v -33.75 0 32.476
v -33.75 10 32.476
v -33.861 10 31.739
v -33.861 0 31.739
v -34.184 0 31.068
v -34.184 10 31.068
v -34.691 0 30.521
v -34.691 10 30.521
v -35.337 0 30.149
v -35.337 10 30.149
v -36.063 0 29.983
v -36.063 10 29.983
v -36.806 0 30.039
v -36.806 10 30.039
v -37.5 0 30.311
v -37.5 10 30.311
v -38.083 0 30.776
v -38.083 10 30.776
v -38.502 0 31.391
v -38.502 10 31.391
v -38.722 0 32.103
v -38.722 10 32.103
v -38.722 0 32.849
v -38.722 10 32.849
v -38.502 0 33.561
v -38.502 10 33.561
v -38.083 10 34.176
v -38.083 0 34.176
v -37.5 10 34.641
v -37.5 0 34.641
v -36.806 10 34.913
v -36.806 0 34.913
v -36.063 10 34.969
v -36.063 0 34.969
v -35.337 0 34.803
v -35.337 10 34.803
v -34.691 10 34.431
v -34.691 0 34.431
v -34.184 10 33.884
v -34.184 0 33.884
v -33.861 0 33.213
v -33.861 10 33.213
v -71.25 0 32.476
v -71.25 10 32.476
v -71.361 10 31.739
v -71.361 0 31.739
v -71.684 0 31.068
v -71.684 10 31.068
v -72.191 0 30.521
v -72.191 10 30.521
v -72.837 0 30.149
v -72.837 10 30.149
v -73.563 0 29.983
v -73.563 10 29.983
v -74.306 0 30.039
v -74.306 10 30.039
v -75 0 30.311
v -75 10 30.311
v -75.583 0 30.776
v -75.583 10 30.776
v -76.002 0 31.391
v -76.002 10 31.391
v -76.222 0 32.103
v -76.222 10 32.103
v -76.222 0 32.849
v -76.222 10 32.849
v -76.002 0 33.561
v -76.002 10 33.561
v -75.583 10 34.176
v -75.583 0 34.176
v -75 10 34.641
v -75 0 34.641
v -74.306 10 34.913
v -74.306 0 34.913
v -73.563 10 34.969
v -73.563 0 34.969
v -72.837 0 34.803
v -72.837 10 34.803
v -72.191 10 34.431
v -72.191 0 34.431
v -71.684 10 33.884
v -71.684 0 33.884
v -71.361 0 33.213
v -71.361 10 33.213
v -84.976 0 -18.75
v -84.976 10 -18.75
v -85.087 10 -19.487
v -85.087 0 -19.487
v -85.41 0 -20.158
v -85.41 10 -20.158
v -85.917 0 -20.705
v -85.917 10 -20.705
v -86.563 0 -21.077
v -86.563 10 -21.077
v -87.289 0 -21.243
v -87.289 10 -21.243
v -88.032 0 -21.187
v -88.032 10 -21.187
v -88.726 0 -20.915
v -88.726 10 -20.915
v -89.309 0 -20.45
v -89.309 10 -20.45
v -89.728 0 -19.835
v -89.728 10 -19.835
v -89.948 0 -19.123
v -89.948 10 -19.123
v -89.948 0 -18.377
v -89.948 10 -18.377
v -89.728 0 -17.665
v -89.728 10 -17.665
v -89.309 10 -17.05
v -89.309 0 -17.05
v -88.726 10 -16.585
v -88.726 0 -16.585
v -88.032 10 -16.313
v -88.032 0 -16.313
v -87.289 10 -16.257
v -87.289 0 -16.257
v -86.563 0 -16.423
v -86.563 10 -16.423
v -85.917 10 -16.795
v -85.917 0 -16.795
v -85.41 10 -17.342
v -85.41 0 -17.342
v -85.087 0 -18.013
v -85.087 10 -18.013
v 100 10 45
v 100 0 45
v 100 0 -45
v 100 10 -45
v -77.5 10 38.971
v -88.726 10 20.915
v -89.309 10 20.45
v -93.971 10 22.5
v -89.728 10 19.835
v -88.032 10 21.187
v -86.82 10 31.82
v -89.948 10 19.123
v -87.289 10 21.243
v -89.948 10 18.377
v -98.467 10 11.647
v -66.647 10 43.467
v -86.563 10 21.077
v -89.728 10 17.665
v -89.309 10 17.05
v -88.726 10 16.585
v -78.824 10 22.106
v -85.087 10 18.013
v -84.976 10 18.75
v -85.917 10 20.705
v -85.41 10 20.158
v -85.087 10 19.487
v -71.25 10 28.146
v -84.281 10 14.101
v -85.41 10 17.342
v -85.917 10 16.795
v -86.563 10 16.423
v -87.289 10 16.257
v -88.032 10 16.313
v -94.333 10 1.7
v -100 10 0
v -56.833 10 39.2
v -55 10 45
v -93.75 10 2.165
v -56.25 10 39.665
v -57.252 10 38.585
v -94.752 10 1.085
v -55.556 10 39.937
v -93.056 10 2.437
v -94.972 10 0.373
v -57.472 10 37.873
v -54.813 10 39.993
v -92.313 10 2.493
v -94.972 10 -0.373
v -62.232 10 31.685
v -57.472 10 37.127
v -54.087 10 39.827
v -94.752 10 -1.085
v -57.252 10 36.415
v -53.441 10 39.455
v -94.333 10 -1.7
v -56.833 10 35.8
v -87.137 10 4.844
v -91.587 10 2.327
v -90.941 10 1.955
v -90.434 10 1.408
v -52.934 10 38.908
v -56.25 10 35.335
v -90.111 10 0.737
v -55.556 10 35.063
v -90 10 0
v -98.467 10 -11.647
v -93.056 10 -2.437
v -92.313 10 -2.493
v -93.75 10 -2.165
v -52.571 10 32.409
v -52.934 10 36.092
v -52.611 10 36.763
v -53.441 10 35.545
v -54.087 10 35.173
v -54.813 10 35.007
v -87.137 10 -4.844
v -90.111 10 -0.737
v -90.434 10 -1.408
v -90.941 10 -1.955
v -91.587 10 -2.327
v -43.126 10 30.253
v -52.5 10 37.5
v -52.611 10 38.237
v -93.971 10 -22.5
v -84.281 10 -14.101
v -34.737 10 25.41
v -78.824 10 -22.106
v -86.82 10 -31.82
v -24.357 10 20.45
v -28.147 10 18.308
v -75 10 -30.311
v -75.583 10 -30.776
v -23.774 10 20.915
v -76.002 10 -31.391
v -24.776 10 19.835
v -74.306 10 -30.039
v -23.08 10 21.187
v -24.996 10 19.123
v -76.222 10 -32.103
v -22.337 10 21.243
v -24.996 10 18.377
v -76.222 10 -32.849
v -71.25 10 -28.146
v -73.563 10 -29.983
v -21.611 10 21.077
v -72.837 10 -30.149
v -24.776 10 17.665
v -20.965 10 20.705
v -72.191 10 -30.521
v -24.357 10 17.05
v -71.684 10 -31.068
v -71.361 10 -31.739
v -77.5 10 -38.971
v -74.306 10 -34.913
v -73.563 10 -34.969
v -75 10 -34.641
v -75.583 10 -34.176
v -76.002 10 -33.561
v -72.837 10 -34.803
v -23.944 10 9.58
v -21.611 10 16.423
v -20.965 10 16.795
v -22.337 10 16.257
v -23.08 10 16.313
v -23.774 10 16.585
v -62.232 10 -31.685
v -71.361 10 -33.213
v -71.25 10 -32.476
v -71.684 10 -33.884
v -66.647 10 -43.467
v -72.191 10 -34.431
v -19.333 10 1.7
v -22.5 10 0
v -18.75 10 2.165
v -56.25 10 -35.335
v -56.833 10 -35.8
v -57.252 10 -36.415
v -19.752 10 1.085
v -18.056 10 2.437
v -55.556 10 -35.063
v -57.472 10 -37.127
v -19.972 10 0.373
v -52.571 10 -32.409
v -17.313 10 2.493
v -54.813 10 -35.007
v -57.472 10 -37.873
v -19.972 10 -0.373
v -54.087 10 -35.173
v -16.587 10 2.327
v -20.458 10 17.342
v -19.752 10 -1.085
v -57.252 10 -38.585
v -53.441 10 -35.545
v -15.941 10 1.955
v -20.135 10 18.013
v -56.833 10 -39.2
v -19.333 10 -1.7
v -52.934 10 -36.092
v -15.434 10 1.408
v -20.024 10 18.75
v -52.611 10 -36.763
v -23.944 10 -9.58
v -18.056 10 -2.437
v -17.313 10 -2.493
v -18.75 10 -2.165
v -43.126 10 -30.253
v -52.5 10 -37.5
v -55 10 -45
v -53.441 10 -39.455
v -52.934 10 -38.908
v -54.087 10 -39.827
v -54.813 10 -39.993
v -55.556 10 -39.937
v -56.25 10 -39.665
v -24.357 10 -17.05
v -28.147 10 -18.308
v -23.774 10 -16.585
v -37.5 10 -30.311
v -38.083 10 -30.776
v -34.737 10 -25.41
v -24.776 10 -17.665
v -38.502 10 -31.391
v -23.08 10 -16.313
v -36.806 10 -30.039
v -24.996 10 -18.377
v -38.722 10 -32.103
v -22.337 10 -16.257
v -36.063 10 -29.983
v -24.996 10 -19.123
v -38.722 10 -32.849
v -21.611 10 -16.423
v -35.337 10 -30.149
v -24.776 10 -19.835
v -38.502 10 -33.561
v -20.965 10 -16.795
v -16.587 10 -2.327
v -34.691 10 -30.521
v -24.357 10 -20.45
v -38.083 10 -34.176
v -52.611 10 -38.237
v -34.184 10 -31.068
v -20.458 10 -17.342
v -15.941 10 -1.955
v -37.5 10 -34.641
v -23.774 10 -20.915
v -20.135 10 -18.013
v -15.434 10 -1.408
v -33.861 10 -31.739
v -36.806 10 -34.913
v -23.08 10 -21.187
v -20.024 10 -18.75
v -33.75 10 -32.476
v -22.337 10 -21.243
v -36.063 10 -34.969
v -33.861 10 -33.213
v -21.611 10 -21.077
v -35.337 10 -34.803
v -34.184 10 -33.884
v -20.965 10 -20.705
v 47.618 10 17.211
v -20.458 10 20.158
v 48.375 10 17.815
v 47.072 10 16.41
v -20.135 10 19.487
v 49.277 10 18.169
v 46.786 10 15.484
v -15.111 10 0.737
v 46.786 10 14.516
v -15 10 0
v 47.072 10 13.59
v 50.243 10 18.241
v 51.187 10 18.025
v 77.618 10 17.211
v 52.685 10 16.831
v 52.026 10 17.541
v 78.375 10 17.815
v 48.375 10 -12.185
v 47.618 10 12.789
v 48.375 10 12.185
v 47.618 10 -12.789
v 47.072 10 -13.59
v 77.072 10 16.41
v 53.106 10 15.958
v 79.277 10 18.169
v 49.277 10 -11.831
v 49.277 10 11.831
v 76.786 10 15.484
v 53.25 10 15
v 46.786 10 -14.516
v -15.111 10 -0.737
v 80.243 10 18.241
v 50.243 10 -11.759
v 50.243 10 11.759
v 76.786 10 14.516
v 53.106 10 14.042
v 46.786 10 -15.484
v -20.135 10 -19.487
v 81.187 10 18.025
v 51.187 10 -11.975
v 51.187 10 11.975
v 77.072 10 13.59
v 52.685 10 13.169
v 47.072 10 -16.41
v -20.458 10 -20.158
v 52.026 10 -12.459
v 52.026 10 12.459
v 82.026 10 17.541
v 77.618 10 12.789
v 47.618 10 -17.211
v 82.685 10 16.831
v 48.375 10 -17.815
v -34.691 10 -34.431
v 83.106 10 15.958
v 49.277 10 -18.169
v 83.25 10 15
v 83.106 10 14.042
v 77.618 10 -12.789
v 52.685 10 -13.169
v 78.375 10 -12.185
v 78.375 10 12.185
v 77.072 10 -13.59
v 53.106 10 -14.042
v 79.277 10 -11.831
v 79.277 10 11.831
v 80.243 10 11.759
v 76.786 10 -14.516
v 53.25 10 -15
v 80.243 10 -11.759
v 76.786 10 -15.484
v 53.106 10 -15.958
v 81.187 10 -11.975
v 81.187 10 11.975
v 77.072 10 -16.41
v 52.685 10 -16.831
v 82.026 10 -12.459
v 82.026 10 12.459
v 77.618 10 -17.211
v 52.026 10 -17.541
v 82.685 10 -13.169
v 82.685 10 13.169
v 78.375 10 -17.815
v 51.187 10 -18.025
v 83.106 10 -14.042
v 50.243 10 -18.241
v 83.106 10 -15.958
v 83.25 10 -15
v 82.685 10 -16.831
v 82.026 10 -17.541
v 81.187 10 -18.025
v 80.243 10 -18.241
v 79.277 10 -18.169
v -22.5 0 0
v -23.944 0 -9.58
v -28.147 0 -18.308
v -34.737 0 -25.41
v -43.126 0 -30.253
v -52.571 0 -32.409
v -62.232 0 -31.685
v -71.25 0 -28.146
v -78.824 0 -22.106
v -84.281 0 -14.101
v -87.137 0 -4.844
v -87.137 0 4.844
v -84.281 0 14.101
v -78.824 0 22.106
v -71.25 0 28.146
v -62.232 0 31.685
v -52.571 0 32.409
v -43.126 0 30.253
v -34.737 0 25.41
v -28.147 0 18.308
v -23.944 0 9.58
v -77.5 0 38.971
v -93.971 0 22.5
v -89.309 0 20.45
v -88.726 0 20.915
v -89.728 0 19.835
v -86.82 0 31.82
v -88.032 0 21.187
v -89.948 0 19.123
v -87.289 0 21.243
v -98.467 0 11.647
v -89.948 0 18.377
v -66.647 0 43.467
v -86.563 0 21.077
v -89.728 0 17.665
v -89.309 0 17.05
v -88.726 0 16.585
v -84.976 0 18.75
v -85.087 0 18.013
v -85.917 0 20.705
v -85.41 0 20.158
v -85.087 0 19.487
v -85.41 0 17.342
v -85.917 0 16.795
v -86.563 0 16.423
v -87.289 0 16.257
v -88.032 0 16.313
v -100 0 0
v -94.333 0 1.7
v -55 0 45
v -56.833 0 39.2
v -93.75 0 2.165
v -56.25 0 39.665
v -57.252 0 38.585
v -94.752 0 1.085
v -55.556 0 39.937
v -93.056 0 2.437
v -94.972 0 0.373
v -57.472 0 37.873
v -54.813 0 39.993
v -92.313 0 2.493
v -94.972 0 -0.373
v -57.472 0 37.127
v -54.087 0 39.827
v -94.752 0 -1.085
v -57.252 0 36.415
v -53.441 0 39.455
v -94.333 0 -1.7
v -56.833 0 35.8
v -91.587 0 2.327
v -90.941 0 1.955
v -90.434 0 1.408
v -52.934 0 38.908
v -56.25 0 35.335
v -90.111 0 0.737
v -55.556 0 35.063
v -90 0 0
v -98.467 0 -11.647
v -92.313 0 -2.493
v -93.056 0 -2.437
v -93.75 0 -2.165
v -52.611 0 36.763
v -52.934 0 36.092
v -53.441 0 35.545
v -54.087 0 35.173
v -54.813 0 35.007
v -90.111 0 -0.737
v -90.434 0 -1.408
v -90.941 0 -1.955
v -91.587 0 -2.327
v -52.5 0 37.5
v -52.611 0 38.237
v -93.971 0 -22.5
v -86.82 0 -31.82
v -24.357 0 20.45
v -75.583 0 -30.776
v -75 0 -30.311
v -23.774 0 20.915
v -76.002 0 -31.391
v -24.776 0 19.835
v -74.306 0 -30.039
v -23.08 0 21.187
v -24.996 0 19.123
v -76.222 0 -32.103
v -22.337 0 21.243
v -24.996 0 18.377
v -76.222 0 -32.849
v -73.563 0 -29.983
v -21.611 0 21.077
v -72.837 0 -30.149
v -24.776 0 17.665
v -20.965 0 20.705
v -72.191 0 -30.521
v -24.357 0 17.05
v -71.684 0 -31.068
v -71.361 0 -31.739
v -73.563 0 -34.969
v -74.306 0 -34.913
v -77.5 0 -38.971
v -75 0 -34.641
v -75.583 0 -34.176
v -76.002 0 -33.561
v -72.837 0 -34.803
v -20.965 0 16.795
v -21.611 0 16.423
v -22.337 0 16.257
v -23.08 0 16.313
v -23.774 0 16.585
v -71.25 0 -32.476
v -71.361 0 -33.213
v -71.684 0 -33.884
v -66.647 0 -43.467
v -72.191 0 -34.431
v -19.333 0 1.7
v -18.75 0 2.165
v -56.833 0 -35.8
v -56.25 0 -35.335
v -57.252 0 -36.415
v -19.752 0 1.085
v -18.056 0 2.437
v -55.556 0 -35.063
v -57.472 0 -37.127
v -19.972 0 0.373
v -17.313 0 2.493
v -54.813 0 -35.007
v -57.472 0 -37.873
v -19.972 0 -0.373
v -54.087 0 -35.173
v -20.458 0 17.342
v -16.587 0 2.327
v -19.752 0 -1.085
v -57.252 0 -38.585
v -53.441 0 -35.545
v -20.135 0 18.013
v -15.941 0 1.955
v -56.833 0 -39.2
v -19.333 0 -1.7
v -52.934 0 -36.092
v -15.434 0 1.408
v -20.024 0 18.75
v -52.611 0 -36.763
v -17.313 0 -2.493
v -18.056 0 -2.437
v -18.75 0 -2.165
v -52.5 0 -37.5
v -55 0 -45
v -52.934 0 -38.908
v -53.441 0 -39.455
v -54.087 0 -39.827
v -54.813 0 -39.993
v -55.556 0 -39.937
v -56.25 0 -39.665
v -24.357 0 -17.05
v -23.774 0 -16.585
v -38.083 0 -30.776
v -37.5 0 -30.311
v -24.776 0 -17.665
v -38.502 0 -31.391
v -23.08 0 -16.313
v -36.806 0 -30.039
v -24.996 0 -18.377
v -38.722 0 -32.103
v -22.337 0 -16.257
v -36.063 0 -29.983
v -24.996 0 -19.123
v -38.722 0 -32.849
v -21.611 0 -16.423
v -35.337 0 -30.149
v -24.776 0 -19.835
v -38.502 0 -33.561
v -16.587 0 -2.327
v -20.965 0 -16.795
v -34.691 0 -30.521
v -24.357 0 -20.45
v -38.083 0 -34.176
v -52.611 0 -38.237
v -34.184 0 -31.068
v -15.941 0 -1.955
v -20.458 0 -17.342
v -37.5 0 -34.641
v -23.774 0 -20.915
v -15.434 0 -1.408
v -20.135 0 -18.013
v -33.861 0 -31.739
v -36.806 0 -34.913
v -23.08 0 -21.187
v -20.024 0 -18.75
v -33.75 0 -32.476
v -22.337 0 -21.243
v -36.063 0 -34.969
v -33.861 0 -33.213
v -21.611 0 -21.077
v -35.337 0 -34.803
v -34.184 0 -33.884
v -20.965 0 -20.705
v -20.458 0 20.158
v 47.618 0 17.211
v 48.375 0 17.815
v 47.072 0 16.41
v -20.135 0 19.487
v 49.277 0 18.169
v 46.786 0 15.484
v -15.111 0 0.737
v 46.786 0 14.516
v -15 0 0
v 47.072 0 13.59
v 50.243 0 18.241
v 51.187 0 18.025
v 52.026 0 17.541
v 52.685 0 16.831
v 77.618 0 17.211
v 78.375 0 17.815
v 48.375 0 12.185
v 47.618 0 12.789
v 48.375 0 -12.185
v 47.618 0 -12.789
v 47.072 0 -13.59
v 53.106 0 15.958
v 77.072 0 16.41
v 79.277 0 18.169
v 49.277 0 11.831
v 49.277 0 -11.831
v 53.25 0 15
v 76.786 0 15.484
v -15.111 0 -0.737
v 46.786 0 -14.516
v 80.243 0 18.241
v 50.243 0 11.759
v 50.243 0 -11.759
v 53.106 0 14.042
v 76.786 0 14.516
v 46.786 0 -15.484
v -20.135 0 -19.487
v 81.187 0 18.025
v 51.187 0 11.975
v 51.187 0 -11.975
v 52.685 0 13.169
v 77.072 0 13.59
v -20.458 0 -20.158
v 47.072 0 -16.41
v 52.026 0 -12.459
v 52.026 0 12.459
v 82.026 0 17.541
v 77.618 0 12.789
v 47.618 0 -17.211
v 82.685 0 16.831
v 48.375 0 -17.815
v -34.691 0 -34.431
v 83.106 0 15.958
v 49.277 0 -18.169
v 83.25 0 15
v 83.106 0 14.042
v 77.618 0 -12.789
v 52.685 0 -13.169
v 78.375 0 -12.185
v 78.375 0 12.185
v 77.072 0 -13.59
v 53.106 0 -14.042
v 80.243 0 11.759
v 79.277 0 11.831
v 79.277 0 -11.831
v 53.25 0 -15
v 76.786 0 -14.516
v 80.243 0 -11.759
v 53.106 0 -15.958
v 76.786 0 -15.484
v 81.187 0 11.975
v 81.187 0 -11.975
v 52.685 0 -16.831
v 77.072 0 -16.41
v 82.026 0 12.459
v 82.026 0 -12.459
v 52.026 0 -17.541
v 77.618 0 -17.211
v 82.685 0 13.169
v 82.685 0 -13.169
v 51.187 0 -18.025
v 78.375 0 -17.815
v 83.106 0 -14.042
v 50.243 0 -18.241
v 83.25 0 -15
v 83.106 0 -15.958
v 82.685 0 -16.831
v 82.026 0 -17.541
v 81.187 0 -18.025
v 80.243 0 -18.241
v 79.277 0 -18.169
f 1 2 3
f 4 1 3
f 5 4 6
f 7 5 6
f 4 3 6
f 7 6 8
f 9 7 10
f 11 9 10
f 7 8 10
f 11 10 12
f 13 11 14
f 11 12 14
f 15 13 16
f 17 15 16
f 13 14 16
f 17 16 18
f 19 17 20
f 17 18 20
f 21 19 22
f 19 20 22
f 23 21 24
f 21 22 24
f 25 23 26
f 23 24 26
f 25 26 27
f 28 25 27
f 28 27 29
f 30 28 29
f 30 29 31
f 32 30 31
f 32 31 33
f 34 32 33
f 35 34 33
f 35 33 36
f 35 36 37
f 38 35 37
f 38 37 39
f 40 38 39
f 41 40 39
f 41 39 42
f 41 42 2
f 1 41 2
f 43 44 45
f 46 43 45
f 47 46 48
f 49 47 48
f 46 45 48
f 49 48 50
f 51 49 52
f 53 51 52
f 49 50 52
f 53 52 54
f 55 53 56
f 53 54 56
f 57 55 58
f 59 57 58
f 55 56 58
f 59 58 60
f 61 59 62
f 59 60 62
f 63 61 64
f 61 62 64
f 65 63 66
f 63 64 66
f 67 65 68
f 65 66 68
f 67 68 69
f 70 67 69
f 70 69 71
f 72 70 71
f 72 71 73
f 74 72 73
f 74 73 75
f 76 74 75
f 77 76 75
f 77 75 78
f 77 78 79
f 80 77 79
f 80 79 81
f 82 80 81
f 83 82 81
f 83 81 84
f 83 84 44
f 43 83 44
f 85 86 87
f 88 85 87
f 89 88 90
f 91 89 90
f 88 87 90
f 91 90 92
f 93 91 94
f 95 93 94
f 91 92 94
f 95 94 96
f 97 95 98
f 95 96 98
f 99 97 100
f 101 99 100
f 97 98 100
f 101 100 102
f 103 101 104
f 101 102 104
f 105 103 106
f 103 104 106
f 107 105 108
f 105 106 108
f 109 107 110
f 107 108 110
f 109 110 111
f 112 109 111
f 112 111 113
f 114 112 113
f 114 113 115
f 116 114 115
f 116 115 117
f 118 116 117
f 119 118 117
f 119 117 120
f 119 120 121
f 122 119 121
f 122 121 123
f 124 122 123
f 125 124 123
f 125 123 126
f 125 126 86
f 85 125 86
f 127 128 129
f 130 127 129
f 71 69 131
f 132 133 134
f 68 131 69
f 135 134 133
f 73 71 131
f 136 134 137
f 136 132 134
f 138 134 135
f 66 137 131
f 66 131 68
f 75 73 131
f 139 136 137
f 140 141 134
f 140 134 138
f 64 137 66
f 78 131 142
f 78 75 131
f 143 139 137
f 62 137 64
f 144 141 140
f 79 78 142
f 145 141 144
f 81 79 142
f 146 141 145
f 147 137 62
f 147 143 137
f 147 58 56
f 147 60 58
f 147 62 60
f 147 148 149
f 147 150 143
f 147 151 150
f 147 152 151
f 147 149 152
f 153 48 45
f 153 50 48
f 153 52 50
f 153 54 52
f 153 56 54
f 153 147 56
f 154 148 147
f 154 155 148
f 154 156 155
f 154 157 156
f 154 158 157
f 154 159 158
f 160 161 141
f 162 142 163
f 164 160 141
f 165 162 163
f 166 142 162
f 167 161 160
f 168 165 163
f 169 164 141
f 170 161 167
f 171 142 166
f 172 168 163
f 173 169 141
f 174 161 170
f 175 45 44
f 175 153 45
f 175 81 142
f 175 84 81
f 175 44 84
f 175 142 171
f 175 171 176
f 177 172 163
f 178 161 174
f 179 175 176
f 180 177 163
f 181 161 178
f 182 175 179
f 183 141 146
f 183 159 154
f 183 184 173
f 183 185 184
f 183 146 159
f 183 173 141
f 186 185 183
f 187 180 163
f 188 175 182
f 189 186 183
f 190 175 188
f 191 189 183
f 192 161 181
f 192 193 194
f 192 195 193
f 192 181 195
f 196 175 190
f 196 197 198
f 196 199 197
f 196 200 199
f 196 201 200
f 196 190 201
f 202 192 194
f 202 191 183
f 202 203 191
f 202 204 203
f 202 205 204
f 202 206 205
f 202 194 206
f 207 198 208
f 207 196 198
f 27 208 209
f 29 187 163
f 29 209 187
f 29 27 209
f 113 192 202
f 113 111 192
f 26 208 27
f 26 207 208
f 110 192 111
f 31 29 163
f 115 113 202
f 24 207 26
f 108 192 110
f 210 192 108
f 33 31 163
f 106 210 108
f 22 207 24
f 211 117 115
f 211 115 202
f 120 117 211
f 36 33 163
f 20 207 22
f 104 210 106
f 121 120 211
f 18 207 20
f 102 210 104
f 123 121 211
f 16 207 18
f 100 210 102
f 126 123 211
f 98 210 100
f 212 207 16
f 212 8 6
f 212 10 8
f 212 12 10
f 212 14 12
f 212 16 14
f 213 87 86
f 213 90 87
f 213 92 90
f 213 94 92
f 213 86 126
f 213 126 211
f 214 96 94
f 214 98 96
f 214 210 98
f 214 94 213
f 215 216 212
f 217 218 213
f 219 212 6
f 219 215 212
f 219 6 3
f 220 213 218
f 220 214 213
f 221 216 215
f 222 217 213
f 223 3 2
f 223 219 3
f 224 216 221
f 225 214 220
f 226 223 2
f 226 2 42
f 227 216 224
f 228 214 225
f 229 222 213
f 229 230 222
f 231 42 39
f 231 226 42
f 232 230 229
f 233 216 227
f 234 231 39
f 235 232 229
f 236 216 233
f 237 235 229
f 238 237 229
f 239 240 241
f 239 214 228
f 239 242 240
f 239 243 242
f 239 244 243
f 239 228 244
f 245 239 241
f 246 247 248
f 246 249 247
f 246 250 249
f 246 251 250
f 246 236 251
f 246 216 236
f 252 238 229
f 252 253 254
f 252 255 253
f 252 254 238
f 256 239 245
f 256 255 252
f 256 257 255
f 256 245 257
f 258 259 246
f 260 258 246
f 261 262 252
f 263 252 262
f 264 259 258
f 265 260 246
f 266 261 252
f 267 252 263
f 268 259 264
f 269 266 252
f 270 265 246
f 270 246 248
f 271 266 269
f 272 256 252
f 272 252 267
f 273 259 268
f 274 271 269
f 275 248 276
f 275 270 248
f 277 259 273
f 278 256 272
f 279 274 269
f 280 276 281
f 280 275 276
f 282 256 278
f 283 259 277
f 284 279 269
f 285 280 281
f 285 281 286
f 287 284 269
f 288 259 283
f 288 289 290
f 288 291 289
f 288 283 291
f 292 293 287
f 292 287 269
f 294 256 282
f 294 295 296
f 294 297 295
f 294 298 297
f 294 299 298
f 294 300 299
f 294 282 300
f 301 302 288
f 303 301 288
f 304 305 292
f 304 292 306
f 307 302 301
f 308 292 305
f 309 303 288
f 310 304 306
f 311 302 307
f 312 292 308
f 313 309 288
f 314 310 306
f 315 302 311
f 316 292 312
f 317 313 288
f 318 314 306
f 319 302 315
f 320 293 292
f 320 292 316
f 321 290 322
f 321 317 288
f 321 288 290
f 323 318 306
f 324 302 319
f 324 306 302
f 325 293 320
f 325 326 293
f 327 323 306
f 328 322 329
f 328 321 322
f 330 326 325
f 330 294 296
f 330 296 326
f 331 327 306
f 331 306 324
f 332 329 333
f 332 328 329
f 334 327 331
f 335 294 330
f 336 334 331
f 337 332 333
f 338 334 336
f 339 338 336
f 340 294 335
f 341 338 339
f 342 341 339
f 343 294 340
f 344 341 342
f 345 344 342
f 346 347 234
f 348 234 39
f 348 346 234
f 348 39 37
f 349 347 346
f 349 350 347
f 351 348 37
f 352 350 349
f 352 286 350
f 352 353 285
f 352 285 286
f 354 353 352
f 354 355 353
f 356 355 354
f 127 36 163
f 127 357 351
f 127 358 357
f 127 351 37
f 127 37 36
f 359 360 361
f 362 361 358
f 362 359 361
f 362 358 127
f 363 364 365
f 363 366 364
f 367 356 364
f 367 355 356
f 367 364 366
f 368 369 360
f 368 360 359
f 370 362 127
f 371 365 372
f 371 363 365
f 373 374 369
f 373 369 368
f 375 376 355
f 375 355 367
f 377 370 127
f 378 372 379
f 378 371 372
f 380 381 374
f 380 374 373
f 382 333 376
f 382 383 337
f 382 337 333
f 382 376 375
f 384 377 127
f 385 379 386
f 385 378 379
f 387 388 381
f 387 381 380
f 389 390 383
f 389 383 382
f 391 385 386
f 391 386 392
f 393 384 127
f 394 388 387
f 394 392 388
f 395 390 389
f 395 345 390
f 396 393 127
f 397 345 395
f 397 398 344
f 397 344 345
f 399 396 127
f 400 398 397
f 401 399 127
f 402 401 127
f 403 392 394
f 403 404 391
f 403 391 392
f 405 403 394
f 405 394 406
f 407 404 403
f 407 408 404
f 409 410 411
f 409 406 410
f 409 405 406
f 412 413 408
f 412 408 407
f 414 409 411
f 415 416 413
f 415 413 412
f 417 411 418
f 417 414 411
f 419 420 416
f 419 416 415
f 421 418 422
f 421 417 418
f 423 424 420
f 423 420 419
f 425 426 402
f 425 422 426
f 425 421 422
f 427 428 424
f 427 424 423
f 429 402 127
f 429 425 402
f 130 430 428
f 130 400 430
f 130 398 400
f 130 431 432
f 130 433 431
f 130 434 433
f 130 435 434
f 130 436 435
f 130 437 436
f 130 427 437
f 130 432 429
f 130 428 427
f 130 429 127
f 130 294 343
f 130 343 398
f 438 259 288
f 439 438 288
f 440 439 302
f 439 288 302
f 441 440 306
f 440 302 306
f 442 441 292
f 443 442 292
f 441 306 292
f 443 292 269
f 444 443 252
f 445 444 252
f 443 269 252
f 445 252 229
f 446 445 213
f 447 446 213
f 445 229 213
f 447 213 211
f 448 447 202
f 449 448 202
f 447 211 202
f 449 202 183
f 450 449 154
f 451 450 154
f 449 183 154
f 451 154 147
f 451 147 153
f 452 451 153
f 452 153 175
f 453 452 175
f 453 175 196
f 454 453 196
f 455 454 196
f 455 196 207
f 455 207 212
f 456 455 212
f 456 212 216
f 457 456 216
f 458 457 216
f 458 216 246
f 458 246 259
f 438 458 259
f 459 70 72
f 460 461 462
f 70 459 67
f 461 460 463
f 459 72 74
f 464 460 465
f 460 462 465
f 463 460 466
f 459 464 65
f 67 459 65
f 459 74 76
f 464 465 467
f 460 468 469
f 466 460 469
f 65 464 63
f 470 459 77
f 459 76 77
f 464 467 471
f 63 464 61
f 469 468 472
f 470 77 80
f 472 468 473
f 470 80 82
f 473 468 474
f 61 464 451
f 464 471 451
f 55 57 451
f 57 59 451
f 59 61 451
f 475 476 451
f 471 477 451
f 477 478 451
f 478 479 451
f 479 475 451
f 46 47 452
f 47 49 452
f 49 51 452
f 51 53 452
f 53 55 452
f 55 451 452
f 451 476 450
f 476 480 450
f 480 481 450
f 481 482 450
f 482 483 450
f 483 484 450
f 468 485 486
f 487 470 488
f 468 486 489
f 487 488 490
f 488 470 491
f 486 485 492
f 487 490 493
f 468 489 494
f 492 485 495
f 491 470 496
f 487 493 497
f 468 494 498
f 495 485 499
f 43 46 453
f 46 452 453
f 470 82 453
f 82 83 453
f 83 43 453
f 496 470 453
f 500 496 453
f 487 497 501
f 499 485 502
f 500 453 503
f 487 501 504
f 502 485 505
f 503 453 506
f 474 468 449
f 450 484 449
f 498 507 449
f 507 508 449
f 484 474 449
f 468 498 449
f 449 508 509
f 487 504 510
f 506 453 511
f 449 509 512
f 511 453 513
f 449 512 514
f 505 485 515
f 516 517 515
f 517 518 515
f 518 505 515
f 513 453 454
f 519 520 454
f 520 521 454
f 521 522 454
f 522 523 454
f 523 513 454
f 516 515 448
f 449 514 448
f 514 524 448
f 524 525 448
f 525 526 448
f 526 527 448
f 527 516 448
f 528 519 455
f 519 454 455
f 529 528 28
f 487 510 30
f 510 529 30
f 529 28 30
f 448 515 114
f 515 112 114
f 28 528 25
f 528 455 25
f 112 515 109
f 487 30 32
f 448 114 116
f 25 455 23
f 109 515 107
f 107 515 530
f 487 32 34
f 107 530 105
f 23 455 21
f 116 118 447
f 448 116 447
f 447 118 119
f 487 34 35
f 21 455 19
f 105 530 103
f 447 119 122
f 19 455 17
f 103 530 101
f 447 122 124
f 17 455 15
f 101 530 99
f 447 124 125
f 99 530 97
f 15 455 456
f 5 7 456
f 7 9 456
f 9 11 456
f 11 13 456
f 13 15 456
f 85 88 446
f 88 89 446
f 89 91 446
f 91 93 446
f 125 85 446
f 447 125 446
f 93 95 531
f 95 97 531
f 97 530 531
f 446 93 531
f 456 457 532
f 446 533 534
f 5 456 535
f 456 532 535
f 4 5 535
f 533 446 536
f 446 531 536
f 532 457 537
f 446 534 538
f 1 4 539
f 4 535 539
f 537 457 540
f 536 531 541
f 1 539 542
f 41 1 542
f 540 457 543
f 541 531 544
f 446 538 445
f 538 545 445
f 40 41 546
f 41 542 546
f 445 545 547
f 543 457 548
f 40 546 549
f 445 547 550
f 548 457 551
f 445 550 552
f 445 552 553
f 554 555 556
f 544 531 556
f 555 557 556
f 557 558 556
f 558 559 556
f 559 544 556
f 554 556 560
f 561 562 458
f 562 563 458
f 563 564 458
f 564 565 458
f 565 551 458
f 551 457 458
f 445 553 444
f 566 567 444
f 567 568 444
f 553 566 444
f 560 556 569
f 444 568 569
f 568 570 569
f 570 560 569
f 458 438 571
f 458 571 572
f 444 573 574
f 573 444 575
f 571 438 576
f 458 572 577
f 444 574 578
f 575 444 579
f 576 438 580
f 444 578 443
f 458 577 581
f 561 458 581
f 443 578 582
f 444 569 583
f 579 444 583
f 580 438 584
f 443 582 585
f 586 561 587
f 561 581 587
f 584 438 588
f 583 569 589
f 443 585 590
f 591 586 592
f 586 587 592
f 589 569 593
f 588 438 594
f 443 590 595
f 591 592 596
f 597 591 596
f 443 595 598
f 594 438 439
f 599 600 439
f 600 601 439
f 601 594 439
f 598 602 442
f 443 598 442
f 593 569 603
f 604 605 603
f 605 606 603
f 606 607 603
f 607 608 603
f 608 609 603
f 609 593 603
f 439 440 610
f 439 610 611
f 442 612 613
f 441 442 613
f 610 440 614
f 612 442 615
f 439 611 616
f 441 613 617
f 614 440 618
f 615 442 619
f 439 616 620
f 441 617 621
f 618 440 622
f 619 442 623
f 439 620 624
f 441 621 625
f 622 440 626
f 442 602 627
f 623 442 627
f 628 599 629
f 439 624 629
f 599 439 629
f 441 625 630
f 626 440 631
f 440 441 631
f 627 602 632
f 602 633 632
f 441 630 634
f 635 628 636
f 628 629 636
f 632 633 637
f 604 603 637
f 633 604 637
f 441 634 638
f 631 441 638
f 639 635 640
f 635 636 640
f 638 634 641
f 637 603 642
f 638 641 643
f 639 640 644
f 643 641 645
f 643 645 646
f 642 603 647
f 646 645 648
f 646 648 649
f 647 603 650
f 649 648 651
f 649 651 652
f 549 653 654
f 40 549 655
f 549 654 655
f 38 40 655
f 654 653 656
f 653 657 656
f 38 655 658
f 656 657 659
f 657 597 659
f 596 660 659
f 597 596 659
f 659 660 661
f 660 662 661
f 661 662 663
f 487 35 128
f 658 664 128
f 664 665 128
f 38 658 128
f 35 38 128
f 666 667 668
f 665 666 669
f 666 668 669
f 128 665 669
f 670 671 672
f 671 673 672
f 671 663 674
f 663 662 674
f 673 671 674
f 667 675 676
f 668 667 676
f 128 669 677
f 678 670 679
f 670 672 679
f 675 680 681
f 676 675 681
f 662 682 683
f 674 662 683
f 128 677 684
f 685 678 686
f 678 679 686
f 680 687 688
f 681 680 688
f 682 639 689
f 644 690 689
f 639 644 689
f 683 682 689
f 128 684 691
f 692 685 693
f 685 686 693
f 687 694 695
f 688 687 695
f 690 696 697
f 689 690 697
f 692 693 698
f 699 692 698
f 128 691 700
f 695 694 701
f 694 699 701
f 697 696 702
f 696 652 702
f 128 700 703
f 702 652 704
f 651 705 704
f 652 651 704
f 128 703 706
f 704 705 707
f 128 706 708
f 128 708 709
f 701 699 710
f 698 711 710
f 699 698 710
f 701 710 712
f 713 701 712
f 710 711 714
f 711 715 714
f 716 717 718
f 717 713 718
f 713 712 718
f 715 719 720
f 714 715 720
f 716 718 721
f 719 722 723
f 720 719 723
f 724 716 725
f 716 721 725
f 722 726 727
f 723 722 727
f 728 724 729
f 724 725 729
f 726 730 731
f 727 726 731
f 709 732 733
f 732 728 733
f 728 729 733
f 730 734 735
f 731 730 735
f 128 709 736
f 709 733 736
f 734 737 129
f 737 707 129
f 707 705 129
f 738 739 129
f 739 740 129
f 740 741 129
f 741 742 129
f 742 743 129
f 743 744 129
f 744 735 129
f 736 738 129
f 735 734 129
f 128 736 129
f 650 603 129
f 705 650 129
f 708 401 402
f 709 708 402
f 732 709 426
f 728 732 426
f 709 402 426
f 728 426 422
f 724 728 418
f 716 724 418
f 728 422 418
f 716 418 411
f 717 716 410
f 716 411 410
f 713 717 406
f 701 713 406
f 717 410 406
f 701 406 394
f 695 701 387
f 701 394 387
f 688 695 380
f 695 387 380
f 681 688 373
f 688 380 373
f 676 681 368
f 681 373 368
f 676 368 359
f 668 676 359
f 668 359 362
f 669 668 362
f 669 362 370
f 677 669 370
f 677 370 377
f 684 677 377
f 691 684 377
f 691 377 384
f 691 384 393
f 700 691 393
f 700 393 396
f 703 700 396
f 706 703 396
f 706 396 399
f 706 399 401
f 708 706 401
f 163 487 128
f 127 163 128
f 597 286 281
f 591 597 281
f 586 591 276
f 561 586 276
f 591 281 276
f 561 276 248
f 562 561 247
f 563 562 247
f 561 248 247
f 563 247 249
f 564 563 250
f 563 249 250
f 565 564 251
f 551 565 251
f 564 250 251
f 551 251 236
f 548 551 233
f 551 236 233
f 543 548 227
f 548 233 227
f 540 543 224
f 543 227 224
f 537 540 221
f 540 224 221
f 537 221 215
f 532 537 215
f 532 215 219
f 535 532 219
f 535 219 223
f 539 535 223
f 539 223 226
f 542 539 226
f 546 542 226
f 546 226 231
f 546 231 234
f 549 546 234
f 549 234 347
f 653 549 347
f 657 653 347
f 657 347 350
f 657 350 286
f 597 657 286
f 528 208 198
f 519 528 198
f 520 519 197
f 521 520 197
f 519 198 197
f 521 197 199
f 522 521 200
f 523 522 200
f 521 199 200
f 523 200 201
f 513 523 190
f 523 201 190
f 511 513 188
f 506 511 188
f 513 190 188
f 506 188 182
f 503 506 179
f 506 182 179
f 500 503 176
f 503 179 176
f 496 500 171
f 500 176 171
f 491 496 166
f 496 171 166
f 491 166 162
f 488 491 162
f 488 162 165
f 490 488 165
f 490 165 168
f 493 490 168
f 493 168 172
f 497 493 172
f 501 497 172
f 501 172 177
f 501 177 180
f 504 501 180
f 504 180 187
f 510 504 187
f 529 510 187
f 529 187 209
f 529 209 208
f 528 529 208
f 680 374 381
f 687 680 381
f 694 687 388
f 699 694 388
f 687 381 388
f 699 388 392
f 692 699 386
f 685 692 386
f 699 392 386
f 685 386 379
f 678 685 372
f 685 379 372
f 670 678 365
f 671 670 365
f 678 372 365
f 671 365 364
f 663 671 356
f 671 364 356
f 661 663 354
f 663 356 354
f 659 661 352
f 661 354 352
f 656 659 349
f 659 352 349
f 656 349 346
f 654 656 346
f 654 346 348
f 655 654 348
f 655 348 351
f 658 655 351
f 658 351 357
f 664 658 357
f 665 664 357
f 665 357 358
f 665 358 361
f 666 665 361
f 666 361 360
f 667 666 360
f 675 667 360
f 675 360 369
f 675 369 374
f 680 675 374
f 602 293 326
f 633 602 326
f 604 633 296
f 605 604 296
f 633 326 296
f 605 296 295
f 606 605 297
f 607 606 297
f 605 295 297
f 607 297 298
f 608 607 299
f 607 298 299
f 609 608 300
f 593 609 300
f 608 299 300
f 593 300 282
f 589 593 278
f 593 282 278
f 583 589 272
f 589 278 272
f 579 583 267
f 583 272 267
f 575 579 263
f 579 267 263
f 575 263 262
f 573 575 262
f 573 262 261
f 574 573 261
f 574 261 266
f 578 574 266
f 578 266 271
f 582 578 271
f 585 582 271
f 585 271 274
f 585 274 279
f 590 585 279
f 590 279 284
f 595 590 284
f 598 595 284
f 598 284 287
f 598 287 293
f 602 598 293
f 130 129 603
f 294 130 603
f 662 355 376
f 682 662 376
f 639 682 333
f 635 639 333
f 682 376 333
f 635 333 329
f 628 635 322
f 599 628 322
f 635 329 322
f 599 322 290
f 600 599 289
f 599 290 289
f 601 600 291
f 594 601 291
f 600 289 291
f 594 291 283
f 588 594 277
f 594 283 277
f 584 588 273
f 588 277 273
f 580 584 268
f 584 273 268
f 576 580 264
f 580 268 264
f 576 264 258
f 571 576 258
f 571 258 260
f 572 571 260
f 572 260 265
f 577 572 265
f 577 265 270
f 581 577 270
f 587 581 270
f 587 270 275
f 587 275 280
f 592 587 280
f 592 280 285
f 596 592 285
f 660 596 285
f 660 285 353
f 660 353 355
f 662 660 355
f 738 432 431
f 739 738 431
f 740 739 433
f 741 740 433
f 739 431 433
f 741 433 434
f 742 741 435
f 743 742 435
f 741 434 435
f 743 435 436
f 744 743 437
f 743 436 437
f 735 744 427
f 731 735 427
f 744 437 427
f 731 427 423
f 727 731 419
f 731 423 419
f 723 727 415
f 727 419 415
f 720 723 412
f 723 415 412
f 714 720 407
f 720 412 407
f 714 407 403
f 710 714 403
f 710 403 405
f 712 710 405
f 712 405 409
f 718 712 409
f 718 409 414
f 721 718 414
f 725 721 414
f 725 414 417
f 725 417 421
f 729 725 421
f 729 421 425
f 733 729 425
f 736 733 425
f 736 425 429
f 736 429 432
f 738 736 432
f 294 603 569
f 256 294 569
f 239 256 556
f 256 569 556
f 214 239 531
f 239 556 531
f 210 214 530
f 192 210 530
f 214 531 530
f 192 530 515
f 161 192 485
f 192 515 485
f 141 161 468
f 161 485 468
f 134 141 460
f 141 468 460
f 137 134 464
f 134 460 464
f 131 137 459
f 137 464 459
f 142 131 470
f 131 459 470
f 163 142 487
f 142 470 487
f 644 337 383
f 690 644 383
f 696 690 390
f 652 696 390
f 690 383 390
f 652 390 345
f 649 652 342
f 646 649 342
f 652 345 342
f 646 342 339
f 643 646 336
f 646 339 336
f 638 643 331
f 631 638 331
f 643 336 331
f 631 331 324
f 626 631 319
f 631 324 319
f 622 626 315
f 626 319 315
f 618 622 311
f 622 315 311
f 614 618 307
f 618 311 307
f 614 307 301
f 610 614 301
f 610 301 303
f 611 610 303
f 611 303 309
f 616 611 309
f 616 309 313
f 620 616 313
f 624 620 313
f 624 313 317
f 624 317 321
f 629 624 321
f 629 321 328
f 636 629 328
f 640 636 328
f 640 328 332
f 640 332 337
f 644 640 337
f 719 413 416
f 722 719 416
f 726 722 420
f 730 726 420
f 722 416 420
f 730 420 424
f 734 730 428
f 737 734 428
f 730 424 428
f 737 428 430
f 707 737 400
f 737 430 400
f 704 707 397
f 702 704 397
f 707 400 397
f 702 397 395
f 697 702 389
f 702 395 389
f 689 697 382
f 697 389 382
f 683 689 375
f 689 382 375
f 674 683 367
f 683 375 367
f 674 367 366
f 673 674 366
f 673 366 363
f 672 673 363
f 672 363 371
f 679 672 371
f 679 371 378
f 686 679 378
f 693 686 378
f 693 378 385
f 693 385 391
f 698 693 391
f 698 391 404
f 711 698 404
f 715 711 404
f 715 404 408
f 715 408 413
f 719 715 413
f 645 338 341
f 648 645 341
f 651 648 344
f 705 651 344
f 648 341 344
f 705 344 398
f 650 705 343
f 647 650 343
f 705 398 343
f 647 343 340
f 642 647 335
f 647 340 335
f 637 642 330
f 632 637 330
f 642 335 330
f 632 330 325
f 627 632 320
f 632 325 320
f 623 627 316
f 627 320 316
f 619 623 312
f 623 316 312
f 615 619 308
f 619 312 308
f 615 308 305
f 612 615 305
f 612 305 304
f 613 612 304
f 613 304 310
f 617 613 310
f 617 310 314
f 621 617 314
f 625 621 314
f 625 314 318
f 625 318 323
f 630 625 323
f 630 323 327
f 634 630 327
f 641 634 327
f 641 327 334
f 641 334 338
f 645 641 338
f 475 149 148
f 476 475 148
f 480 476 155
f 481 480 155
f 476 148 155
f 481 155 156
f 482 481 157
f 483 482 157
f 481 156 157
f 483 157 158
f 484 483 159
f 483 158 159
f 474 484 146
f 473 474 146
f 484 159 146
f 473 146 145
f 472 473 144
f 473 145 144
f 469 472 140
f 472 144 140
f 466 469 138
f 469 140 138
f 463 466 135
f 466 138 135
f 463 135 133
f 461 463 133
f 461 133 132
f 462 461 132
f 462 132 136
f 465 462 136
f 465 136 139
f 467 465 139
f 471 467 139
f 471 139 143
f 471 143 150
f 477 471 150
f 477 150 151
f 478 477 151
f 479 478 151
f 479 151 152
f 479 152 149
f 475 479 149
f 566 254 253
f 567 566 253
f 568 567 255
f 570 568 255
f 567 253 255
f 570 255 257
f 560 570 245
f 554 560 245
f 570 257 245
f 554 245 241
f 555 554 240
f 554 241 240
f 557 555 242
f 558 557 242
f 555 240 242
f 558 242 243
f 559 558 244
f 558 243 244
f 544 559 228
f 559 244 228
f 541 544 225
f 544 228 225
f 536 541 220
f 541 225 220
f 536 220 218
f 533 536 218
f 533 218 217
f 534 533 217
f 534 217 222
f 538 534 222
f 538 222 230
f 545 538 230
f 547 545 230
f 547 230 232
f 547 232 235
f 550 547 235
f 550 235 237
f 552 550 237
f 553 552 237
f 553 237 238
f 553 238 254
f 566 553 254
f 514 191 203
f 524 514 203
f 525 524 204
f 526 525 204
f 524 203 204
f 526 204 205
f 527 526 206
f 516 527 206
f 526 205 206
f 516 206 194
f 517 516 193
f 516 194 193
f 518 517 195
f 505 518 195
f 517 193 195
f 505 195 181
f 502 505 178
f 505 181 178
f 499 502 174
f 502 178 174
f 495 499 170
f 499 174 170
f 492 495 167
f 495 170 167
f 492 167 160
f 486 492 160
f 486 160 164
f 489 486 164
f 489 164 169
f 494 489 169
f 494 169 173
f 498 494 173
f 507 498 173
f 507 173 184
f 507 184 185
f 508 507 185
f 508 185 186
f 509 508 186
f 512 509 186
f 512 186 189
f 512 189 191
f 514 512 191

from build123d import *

# Parameters (mm, degrees)
BOSS_EXTRUDE1_DEPTH = 10
SKETCH2_R           = 2.5
SKETCH2_R_2         = 32.5
CUT_EXTRUDE1_DEPTH  = 11
SKETCH3_R           = 3.25
CUT_EXTRUDE2_DEPTH  = 11


with BuildPart() as part:
    # Sketch1 → Boss-Extrude1 (new body)
    with BuildSketch(Plane(origin=(0, 0, 0), x_dir=(1, 0, 0), z_dir=(0, 1, 0))):
        with BuildLine():
            Line((100, 45), (-55, 45))
            ThreePointArc((-55, 45), (-100, 0), (-55, -45))
            Line((-55, -45), (100, -45))
            Line((100, -45), (100, 45))
        make_face()
    extrude(amount=BOSS_EXTRUDE1_DEPTH)

    # Sketch2 → Cut-Extrude1 (cut, through all)
    with BuildSketch(Plane(origin=(0, 10, 0), x_dir=(1, 0, 0), z_dir=(0, 1, 0))):
        with Locations((-92.5, 0)):
            Circle(SKETCH2_R)
        with Locations((-87.475952642, 18.75)):
            Circle(SKETCH2_R)
        with Locations((-73.75, 32.475952642)):
            Circle(SKETCH2_R)
        with Locations((-55, 0)):
            Circle(SKETCH2_R_2)
        with Locations((-55, 37.5)):
            Circle(SKETCH2_R)
        with Locations((-36.25, 32.475952642)):
            Circle(SKETCH2_R)
        with Locations((-22.524047358, 18.75)):
            Circle(SKETCH2_R)
        with Locations((-17.5, 0)):
            Circle(SKETCH2_R)
        with Locations((-22.524047358, -18.75)):
            Circle(SKETCH2_R)
        with Locations((-36.25, -32.475952642)):
            Circle(SKETCH2_R)
        with Locations((-55, -37.5)):
            Circle(SKETCH2_R)
        with Locations((-73.75, -32.475952642)):
            Circle(SKETCH2_R)
        with Locations((-87.475952642, -18.75)):
            Circle(SKETCH2_R)
    extrude(amount=-CUT_EXTRUDE1_DEPTH, mode=Mode.SUBTRACT)

    # Sketch3 → Cut-Extrude2 (cut, through all)
    with BuildSketch(Plane(origin=(0, 10, 0), x_dir=(1, 0, 0), z_dir=(0, 1, 0))):
        with Locations((80, 15)):
            Circle(SKETCH3_R)
        with Locations((50, 15)):
            Circle(SKETCH3_R)
        with Locations((50, -15)):
            Circle(SKETCH3_R)
        with Locations((80, -15)):
            Circle(SKETCH3_R)
    extrude(amount=-CUT_EXTRUDE2_DEPTH, mode=Mode.SUBTRACT)


solid = part.part
